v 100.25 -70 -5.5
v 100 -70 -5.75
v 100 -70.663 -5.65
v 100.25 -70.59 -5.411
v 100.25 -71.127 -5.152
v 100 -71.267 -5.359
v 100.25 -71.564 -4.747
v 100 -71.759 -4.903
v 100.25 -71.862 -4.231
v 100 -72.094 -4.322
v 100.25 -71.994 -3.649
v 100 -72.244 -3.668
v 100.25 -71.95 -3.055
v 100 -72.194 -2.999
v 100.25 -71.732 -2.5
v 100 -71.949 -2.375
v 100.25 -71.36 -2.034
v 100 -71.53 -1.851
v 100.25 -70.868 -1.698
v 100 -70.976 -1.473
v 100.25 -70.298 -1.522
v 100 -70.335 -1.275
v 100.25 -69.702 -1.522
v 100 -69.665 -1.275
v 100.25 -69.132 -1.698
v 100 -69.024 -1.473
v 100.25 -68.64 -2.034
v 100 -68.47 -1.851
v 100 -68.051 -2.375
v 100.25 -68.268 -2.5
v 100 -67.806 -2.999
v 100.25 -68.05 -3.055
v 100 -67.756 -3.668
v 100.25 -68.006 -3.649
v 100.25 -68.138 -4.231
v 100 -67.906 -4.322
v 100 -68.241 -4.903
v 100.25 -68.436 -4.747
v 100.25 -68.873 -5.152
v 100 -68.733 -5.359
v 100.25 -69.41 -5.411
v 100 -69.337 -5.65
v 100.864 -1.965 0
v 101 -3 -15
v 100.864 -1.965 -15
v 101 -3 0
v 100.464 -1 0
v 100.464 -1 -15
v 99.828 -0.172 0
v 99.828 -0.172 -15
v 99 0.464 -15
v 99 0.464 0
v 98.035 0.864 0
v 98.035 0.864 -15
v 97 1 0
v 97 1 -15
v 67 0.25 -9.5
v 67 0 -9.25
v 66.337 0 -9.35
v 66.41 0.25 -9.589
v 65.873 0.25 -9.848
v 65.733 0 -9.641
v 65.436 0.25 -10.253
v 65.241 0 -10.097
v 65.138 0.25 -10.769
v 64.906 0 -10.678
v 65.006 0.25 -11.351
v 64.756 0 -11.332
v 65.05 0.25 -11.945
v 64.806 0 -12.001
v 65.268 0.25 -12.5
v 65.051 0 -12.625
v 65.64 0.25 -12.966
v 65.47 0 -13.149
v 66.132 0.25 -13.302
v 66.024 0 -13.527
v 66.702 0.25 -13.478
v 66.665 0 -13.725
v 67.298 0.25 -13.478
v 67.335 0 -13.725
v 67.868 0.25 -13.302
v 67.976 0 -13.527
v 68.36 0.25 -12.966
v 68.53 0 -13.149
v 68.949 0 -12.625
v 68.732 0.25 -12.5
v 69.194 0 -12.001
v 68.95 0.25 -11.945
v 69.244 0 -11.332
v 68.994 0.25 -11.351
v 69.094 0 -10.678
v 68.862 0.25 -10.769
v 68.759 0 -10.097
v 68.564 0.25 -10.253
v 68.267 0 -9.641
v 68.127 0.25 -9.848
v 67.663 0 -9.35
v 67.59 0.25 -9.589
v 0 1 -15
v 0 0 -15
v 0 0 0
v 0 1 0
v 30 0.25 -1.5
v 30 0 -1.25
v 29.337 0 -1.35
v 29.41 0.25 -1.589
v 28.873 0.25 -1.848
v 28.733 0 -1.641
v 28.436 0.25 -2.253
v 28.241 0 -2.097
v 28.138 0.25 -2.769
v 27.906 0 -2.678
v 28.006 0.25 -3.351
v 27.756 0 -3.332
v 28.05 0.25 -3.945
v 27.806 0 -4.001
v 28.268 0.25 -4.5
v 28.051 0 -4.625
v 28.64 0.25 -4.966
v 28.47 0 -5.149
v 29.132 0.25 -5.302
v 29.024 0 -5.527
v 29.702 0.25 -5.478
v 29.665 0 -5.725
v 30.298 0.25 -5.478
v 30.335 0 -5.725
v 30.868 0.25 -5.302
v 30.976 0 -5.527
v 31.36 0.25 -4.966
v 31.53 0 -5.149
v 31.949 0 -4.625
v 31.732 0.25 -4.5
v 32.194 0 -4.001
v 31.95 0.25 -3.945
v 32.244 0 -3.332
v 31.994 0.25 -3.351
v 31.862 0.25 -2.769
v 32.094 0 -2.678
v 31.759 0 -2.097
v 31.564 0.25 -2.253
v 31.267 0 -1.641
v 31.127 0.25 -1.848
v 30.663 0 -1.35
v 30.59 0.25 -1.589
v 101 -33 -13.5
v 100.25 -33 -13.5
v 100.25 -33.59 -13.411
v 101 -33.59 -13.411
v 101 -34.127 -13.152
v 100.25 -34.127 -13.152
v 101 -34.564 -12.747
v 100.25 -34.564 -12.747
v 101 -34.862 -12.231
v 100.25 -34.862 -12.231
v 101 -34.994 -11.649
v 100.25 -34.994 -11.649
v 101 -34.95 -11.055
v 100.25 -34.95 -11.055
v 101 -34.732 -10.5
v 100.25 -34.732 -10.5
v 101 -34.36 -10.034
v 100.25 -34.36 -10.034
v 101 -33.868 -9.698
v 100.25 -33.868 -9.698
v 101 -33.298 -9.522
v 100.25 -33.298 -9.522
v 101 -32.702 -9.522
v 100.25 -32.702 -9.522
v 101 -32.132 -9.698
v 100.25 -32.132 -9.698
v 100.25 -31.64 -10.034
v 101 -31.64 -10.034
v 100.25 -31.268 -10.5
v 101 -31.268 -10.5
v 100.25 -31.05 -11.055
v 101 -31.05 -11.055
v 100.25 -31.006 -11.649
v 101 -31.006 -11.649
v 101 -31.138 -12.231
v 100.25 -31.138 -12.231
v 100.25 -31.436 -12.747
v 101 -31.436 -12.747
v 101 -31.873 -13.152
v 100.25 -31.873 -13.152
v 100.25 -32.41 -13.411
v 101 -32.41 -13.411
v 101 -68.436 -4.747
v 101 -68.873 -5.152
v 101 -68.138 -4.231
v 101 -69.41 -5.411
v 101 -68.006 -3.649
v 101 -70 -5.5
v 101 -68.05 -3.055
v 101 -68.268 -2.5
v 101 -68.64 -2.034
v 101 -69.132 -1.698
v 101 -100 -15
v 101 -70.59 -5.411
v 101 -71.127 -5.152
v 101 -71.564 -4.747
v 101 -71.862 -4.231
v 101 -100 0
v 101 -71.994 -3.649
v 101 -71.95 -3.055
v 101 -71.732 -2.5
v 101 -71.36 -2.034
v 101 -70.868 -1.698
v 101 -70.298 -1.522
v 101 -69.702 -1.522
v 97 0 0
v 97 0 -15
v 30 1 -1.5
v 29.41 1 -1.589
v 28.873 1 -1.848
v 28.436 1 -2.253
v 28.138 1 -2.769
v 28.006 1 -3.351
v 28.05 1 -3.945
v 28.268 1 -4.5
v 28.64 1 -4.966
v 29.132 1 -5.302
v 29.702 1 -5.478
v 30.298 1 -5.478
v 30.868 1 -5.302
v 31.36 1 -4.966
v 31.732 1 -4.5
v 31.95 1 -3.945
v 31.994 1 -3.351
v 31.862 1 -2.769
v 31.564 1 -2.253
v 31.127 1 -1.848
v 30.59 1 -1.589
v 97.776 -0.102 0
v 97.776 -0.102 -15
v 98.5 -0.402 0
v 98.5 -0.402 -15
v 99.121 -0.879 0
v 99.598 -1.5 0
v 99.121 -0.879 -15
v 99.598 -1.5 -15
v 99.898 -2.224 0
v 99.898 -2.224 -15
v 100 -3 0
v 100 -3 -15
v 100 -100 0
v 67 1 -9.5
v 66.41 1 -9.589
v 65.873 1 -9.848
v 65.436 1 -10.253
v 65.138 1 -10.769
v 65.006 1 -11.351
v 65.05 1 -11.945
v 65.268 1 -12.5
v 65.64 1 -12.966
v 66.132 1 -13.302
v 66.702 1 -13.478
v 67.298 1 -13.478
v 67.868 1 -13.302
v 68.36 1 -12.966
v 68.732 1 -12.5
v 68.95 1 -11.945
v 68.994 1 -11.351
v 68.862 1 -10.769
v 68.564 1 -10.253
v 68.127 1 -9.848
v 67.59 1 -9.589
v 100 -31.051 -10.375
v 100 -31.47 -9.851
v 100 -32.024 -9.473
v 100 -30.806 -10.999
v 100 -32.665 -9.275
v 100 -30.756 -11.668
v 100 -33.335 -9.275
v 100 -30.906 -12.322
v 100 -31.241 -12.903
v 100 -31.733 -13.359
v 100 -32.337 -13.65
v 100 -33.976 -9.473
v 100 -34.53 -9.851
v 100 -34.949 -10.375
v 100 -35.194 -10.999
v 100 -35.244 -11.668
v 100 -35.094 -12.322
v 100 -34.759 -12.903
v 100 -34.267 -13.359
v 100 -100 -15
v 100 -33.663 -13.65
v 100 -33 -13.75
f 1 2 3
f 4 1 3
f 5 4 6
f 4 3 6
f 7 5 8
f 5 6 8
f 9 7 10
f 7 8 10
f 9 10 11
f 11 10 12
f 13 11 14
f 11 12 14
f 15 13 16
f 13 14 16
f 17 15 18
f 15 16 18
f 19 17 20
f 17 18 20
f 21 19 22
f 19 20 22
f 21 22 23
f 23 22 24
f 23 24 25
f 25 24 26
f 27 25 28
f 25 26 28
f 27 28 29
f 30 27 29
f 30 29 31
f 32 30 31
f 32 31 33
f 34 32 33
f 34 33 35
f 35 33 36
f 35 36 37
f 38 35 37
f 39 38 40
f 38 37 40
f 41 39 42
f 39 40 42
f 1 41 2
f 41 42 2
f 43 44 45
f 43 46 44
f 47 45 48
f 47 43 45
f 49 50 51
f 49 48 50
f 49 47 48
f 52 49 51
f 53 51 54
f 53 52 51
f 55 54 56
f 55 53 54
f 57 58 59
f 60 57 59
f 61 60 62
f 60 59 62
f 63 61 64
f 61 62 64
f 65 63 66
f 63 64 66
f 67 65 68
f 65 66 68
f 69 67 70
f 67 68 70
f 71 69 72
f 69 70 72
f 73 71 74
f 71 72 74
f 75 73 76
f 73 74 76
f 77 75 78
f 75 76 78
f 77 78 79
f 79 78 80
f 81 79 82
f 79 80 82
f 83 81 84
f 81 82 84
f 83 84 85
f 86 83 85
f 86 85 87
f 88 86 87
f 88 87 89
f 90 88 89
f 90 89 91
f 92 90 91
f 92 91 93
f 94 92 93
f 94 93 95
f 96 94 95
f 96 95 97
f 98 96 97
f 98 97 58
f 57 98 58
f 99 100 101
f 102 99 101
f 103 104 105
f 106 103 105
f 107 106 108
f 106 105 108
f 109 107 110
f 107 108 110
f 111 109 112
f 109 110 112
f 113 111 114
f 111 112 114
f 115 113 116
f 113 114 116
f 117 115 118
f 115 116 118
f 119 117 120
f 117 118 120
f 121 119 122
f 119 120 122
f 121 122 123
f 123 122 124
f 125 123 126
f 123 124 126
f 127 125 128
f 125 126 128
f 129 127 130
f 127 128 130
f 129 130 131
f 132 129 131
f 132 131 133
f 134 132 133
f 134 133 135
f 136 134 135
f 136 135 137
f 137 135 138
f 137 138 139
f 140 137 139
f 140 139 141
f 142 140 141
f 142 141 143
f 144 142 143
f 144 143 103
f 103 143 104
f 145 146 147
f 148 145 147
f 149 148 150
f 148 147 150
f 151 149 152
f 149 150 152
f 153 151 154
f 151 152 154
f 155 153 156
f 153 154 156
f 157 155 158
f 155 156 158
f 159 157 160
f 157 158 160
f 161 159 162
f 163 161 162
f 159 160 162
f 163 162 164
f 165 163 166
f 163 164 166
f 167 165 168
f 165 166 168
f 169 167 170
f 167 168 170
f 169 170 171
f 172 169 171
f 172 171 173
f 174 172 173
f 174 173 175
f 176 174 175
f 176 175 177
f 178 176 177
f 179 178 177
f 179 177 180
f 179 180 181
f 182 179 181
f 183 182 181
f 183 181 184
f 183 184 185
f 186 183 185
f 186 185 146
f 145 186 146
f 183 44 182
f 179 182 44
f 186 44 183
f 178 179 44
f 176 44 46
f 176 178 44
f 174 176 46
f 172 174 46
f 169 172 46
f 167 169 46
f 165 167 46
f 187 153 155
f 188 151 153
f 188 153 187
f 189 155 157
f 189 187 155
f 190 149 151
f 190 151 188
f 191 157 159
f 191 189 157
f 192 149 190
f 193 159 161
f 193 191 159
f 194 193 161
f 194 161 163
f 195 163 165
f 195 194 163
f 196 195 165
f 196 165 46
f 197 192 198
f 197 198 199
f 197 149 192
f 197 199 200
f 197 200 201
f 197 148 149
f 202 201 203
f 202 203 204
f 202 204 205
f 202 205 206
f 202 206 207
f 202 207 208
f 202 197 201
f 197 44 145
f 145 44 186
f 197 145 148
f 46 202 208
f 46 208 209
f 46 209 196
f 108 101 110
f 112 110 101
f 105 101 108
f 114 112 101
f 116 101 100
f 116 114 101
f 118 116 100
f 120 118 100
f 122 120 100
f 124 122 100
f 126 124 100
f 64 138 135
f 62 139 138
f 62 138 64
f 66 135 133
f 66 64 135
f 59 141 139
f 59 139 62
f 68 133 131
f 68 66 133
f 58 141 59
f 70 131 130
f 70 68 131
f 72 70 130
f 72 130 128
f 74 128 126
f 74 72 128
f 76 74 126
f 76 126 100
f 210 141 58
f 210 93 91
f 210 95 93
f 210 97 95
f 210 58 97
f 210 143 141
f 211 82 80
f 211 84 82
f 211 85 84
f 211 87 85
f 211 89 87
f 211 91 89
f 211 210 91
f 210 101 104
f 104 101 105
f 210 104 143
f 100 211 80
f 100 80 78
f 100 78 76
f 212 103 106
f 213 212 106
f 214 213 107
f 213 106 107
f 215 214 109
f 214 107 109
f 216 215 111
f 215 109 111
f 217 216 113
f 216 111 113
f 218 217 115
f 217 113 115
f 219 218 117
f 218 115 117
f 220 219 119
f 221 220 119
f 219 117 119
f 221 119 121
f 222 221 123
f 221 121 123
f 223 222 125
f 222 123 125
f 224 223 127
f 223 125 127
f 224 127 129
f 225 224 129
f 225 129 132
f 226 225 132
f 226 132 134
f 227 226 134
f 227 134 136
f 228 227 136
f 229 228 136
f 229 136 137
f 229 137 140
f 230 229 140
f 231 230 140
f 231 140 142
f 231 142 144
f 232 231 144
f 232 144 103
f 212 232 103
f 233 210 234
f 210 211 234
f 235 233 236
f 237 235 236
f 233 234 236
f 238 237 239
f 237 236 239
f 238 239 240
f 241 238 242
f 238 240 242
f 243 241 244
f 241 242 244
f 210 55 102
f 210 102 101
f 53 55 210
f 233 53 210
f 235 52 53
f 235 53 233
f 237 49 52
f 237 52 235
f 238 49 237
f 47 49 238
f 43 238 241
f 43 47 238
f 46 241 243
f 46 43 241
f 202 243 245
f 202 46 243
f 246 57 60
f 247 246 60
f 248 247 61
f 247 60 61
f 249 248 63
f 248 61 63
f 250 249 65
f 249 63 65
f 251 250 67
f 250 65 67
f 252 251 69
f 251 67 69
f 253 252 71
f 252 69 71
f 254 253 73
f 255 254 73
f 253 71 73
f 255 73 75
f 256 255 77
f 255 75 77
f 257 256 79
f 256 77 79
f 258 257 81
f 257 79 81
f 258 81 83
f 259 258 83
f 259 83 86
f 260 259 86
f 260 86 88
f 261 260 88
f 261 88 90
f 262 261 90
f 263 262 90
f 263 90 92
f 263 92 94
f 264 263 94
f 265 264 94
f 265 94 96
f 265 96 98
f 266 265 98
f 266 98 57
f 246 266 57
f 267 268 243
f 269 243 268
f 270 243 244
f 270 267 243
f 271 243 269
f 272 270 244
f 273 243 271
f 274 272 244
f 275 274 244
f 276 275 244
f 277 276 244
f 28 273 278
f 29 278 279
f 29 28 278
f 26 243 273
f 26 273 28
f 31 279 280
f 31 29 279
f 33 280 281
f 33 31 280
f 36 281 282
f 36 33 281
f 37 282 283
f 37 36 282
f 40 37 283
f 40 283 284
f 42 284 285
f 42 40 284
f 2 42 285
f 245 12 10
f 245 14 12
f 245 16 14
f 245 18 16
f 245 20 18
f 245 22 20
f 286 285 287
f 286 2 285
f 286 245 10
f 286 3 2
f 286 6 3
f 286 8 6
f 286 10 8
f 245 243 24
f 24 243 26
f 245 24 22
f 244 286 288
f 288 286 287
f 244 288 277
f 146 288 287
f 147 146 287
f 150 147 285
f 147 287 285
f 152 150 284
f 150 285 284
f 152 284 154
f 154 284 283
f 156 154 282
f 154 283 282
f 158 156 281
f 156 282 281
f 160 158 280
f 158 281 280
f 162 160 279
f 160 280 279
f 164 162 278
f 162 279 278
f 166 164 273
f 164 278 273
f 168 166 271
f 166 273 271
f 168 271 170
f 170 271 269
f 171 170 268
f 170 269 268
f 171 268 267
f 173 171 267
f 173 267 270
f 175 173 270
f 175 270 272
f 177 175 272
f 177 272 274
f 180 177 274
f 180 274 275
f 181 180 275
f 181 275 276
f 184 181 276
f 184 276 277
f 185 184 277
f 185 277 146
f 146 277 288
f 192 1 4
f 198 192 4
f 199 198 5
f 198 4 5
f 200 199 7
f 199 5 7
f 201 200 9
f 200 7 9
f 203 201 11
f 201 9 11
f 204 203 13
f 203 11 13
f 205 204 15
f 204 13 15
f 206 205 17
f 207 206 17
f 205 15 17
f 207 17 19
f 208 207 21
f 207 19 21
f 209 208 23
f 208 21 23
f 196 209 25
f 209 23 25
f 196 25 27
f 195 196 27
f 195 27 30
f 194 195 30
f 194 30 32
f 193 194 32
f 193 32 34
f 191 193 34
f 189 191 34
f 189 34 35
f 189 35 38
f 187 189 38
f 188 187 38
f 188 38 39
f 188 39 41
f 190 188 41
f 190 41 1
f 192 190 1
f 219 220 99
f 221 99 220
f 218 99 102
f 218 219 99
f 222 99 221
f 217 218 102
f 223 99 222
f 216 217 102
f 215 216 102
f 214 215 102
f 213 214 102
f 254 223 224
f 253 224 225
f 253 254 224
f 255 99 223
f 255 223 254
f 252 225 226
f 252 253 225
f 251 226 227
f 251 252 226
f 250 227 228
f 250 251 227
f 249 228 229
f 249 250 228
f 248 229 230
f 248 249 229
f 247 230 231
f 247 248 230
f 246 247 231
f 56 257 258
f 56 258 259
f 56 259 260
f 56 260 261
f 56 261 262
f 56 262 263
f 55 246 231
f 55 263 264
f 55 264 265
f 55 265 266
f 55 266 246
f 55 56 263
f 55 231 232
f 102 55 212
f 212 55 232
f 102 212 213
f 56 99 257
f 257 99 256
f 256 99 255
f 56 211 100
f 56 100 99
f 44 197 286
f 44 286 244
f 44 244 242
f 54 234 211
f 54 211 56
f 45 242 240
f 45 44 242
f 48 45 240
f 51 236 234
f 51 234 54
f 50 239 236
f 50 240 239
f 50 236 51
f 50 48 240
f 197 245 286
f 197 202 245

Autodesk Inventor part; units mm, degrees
ref_plane "YZ Plane" through (0, 0, 0) normal (1, 0, 0) x (0, 1, 0)
ref_plane "XZ Plane" through (0, 0, 0) normal (0, 1, 0) x (-1, 0, 0)
ref_plane "XY Plane" through (0, 0, 0) normal (0, 0, 1) x (1, 0, 0)
sketch "Sketch1" plane through (0, 0, 0) normal (0, 0, 1) x (1, 0, 0)
  line L0 (0, 0) -> (97, 0)
  line L1 (100, -3) -> (100, -100)
  arc A0 (100, -3) -> (97, 0) centre (97, -3) ccw
  point P0 (100, 0)
  dimension "d0" = 100
  dimension "d1" = 100
  dimension "d7" = 3
sketch "Sketch2" plane through (0, 0, 0) normal (1, 0, 0) x (0, 1, 0)
  line L0 (0, 0) -> (0, -15)
  line L1 (0, -15) -> (1, -15)
  line L2 (1, -15) -> (1, 0)
  line L3 (1, 0) -> (0, 0)
  dimension "d2" = 15
  dimension "d3" = 1
  dimension "d4" = 15
sweep "Sweep1" add profiles "Sketch2" path "Sketch1"
hole "Hole1" at (30, 1, -3.5) direction (0, -1, 0) diameter 4 end through all
hole "Hole2" at (67, 1, -11.5) direction (0, -1, 0) diameter 4 end through all
hole "Hole3" at (101, -33, -11.5) direction (-1, 0, 0) diameter 4 end through all
hole "Hole4" at (101, -70, -3.5) direction (-1, 0, 0) diameter 4 end through all
chamfer "Chamfer1" distance 0.25 angle 45 4 edges at (30, 0, -5.5) (67, 0, -13.5) (100, -33, -9.5) (100, -70, -1.5)
properties part number "80mmCornerBracket"
